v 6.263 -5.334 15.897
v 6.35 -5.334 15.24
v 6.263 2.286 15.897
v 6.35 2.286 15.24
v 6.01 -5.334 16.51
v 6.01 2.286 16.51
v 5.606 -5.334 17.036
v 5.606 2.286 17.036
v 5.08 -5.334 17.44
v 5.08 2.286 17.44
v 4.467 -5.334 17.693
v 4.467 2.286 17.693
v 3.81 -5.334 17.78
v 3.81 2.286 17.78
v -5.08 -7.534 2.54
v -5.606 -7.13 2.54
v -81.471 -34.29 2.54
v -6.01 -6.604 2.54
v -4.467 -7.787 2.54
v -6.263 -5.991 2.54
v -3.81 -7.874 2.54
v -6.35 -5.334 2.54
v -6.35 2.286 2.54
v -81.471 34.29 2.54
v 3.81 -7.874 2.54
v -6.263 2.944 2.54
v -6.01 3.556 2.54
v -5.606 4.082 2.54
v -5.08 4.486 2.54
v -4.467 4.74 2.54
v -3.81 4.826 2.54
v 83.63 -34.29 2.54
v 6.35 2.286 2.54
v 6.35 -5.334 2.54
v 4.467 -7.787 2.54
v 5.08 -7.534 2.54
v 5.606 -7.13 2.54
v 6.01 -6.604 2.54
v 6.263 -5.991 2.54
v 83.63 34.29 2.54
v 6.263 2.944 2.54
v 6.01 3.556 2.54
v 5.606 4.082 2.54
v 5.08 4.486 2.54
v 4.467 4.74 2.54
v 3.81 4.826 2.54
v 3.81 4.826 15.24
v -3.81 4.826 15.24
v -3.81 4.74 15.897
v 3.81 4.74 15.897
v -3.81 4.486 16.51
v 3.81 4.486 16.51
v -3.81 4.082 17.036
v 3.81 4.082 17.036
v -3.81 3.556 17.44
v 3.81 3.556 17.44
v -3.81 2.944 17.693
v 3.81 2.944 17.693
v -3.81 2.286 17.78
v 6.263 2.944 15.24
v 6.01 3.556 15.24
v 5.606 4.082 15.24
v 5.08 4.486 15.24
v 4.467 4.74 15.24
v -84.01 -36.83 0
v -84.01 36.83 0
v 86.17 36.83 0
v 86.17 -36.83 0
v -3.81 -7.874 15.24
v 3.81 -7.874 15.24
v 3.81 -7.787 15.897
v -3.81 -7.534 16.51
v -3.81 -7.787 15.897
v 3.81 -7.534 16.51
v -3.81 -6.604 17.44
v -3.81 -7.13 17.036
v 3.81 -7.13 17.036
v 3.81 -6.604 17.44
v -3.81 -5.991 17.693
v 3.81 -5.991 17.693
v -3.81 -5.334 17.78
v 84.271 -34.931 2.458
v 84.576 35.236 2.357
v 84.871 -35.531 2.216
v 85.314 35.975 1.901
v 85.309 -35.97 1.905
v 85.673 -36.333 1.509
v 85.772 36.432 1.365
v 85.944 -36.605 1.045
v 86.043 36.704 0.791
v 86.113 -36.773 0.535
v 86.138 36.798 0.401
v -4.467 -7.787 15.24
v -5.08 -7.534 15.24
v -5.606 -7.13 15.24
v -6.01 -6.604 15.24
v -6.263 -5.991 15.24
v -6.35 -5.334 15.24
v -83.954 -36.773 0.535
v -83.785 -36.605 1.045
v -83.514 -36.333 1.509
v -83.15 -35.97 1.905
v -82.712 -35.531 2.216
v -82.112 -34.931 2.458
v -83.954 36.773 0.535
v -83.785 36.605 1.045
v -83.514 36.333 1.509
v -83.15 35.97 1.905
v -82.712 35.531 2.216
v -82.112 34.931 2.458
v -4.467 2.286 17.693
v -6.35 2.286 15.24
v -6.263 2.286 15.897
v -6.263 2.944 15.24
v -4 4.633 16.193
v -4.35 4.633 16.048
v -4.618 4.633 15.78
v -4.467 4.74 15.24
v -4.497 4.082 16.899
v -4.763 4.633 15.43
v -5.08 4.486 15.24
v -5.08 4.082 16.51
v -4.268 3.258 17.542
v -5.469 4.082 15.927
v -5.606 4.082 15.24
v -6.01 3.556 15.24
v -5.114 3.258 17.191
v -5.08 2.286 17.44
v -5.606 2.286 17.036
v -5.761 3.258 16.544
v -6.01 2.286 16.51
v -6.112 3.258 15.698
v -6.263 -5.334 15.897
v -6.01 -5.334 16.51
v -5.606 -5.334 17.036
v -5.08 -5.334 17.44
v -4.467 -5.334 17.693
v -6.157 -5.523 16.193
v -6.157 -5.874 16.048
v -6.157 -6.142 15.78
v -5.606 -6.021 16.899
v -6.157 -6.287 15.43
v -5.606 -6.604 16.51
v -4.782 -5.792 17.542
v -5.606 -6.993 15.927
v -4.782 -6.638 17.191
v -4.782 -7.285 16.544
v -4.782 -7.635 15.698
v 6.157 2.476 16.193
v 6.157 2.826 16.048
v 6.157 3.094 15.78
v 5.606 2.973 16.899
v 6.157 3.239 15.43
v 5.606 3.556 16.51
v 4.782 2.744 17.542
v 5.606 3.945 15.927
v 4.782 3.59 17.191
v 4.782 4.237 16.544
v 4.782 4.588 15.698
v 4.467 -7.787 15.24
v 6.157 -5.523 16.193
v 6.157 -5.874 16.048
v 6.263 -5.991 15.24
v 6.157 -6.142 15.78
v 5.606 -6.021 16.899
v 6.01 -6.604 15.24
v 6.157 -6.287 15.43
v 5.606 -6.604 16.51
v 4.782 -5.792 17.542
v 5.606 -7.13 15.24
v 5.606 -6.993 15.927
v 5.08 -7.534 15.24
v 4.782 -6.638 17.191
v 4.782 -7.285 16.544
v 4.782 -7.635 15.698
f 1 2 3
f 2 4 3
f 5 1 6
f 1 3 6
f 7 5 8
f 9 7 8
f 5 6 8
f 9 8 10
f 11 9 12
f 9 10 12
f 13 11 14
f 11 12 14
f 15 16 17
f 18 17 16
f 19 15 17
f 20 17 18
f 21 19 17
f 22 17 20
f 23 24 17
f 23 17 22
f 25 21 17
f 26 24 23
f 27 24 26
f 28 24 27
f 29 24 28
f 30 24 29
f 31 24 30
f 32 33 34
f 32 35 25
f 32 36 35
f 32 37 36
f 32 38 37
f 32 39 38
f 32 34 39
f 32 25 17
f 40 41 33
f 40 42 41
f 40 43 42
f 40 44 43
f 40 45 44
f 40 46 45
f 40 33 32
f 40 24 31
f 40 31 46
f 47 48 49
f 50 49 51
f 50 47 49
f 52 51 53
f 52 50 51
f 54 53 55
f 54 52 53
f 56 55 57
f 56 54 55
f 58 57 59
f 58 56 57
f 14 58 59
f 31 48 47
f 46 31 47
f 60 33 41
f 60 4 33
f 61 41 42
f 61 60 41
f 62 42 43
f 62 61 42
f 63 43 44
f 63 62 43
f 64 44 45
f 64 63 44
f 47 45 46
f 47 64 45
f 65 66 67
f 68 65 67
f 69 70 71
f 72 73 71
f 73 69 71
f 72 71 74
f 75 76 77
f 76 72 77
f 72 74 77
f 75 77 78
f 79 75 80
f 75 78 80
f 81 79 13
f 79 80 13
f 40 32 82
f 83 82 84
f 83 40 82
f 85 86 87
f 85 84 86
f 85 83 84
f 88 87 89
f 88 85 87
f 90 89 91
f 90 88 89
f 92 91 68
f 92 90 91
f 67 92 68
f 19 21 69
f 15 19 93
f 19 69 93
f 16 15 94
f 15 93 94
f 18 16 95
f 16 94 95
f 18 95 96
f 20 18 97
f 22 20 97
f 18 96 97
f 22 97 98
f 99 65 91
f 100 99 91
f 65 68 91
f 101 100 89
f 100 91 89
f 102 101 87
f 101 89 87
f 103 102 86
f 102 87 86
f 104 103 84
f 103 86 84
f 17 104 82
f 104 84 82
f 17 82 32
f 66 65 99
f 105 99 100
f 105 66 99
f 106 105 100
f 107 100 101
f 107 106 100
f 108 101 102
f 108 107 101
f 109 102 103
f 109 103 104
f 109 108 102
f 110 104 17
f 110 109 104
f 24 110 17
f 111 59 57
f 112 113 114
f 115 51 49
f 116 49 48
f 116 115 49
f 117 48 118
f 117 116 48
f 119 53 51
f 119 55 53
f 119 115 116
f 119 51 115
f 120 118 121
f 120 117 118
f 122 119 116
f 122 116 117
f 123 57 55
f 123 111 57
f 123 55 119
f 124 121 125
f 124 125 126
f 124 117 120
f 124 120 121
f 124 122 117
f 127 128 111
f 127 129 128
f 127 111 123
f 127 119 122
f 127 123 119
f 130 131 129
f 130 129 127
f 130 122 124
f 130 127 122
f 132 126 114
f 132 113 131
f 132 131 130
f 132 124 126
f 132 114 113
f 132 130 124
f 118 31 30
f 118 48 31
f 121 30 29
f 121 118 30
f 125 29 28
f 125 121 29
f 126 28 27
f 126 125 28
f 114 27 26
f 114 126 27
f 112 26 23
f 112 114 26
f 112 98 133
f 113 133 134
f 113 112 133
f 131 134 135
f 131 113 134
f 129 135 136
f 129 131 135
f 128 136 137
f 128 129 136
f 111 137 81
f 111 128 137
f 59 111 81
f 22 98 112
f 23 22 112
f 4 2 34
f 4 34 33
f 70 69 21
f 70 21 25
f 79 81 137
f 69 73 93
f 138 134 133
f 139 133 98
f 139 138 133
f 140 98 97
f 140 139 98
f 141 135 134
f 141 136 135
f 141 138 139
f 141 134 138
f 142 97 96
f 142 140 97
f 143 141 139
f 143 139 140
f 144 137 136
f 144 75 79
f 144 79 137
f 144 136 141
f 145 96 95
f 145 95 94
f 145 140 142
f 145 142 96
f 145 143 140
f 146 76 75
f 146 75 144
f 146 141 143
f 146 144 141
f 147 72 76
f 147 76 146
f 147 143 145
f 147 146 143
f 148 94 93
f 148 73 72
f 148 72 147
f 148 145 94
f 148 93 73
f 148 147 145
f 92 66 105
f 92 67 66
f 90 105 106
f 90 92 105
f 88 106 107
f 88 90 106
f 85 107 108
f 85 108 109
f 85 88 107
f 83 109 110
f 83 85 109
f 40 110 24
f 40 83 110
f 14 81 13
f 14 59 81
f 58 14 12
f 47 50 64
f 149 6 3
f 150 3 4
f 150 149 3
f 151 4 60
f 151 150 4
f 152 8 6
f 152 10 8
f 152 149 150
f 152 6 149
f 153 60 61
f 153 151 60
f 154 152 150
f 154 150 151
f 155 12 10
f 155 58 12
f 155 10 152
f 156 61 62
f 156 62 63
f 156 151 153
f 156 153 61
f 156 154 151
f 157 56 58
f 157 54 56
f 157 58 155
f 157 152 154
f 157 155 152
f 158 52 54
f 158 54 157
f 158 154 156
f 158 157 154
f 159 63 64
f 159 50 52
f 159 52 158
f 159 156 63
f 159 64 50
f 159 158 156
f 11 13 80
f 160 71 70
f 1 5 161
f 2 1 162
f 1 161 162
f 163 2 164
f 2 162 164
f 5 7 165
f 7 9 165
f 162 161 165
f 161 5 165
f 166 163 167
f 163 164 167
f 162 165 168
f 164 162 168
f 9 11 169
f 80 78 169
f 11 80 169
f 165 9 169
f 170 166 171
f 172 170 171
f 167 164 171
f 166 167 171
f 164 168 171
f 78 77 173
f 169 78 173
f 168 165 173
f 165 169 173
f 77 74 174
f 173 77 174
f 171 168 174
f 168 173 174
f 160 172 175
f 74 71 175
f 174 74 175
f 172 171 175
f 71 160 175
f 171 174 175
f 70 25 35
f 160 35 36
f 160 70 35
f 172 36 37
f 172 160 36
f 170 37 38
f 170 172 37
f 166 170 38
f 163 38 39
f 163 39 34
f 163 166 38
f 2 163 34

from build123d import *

# Parameters (mm, degrees)
F0_W     = 170.18
F0_H     = 73.66
F1_DEPTH = 2.54
F2_W     = 12.7
F2_H     = 12.7
F3_DEPTH = 15.24
F4_R     = 2.53999


# Not quite as in the source:
# - a fillet or chamfer is up to 0.001 mm smaller than in the source, because OpenCascade refuses the exact size


with BuildPart() as f1:
    # F0 (on Top) → F1 (new body)
    with BuildSketch(Plane.XY):
        with Locations((1.0795005364, 0)):
            Rectangle(F0_W, F0_H)
    extrude(amount=F1_DEPTH)

    # F2 (on face) → F3 (join)
    with BuildSketch(Plane.XY.offset(2.54)):
        with Locations((0, -1.5238544315)):
            Rectangle(F2_W, F2_H)
    extrude(amount=F3_DEPTH)

    # F4 (radius 2.54 in the source; OpenCascade refuses exactly that, so slightly less here)
    f4_edges = [f1.edges().sort_by_distance(p)[0] for p in [
        (0, -7.873854, 17.78),
        (-6.35, -1.523854, 17.78),
        (0, 4.826146, 17.78),
        (6.35, -1.523854, 17.78),
        (-6.35, -7.873854, 10.16),
        (6.35, -7.873854, 10.16),
        (6.35, 4.826146, 10.16),
        (-6.35, 4.826146, 10.16),
        (1.079501, -36.83, 2.54),
        (86.169501, 0, 2.54),
        (1.079501, 36.83, 2.54),
        (-84.010499, 0, 2.54),
    ]]
    fillet(f4_edges, radius=F4_R)


solid = f1.part
